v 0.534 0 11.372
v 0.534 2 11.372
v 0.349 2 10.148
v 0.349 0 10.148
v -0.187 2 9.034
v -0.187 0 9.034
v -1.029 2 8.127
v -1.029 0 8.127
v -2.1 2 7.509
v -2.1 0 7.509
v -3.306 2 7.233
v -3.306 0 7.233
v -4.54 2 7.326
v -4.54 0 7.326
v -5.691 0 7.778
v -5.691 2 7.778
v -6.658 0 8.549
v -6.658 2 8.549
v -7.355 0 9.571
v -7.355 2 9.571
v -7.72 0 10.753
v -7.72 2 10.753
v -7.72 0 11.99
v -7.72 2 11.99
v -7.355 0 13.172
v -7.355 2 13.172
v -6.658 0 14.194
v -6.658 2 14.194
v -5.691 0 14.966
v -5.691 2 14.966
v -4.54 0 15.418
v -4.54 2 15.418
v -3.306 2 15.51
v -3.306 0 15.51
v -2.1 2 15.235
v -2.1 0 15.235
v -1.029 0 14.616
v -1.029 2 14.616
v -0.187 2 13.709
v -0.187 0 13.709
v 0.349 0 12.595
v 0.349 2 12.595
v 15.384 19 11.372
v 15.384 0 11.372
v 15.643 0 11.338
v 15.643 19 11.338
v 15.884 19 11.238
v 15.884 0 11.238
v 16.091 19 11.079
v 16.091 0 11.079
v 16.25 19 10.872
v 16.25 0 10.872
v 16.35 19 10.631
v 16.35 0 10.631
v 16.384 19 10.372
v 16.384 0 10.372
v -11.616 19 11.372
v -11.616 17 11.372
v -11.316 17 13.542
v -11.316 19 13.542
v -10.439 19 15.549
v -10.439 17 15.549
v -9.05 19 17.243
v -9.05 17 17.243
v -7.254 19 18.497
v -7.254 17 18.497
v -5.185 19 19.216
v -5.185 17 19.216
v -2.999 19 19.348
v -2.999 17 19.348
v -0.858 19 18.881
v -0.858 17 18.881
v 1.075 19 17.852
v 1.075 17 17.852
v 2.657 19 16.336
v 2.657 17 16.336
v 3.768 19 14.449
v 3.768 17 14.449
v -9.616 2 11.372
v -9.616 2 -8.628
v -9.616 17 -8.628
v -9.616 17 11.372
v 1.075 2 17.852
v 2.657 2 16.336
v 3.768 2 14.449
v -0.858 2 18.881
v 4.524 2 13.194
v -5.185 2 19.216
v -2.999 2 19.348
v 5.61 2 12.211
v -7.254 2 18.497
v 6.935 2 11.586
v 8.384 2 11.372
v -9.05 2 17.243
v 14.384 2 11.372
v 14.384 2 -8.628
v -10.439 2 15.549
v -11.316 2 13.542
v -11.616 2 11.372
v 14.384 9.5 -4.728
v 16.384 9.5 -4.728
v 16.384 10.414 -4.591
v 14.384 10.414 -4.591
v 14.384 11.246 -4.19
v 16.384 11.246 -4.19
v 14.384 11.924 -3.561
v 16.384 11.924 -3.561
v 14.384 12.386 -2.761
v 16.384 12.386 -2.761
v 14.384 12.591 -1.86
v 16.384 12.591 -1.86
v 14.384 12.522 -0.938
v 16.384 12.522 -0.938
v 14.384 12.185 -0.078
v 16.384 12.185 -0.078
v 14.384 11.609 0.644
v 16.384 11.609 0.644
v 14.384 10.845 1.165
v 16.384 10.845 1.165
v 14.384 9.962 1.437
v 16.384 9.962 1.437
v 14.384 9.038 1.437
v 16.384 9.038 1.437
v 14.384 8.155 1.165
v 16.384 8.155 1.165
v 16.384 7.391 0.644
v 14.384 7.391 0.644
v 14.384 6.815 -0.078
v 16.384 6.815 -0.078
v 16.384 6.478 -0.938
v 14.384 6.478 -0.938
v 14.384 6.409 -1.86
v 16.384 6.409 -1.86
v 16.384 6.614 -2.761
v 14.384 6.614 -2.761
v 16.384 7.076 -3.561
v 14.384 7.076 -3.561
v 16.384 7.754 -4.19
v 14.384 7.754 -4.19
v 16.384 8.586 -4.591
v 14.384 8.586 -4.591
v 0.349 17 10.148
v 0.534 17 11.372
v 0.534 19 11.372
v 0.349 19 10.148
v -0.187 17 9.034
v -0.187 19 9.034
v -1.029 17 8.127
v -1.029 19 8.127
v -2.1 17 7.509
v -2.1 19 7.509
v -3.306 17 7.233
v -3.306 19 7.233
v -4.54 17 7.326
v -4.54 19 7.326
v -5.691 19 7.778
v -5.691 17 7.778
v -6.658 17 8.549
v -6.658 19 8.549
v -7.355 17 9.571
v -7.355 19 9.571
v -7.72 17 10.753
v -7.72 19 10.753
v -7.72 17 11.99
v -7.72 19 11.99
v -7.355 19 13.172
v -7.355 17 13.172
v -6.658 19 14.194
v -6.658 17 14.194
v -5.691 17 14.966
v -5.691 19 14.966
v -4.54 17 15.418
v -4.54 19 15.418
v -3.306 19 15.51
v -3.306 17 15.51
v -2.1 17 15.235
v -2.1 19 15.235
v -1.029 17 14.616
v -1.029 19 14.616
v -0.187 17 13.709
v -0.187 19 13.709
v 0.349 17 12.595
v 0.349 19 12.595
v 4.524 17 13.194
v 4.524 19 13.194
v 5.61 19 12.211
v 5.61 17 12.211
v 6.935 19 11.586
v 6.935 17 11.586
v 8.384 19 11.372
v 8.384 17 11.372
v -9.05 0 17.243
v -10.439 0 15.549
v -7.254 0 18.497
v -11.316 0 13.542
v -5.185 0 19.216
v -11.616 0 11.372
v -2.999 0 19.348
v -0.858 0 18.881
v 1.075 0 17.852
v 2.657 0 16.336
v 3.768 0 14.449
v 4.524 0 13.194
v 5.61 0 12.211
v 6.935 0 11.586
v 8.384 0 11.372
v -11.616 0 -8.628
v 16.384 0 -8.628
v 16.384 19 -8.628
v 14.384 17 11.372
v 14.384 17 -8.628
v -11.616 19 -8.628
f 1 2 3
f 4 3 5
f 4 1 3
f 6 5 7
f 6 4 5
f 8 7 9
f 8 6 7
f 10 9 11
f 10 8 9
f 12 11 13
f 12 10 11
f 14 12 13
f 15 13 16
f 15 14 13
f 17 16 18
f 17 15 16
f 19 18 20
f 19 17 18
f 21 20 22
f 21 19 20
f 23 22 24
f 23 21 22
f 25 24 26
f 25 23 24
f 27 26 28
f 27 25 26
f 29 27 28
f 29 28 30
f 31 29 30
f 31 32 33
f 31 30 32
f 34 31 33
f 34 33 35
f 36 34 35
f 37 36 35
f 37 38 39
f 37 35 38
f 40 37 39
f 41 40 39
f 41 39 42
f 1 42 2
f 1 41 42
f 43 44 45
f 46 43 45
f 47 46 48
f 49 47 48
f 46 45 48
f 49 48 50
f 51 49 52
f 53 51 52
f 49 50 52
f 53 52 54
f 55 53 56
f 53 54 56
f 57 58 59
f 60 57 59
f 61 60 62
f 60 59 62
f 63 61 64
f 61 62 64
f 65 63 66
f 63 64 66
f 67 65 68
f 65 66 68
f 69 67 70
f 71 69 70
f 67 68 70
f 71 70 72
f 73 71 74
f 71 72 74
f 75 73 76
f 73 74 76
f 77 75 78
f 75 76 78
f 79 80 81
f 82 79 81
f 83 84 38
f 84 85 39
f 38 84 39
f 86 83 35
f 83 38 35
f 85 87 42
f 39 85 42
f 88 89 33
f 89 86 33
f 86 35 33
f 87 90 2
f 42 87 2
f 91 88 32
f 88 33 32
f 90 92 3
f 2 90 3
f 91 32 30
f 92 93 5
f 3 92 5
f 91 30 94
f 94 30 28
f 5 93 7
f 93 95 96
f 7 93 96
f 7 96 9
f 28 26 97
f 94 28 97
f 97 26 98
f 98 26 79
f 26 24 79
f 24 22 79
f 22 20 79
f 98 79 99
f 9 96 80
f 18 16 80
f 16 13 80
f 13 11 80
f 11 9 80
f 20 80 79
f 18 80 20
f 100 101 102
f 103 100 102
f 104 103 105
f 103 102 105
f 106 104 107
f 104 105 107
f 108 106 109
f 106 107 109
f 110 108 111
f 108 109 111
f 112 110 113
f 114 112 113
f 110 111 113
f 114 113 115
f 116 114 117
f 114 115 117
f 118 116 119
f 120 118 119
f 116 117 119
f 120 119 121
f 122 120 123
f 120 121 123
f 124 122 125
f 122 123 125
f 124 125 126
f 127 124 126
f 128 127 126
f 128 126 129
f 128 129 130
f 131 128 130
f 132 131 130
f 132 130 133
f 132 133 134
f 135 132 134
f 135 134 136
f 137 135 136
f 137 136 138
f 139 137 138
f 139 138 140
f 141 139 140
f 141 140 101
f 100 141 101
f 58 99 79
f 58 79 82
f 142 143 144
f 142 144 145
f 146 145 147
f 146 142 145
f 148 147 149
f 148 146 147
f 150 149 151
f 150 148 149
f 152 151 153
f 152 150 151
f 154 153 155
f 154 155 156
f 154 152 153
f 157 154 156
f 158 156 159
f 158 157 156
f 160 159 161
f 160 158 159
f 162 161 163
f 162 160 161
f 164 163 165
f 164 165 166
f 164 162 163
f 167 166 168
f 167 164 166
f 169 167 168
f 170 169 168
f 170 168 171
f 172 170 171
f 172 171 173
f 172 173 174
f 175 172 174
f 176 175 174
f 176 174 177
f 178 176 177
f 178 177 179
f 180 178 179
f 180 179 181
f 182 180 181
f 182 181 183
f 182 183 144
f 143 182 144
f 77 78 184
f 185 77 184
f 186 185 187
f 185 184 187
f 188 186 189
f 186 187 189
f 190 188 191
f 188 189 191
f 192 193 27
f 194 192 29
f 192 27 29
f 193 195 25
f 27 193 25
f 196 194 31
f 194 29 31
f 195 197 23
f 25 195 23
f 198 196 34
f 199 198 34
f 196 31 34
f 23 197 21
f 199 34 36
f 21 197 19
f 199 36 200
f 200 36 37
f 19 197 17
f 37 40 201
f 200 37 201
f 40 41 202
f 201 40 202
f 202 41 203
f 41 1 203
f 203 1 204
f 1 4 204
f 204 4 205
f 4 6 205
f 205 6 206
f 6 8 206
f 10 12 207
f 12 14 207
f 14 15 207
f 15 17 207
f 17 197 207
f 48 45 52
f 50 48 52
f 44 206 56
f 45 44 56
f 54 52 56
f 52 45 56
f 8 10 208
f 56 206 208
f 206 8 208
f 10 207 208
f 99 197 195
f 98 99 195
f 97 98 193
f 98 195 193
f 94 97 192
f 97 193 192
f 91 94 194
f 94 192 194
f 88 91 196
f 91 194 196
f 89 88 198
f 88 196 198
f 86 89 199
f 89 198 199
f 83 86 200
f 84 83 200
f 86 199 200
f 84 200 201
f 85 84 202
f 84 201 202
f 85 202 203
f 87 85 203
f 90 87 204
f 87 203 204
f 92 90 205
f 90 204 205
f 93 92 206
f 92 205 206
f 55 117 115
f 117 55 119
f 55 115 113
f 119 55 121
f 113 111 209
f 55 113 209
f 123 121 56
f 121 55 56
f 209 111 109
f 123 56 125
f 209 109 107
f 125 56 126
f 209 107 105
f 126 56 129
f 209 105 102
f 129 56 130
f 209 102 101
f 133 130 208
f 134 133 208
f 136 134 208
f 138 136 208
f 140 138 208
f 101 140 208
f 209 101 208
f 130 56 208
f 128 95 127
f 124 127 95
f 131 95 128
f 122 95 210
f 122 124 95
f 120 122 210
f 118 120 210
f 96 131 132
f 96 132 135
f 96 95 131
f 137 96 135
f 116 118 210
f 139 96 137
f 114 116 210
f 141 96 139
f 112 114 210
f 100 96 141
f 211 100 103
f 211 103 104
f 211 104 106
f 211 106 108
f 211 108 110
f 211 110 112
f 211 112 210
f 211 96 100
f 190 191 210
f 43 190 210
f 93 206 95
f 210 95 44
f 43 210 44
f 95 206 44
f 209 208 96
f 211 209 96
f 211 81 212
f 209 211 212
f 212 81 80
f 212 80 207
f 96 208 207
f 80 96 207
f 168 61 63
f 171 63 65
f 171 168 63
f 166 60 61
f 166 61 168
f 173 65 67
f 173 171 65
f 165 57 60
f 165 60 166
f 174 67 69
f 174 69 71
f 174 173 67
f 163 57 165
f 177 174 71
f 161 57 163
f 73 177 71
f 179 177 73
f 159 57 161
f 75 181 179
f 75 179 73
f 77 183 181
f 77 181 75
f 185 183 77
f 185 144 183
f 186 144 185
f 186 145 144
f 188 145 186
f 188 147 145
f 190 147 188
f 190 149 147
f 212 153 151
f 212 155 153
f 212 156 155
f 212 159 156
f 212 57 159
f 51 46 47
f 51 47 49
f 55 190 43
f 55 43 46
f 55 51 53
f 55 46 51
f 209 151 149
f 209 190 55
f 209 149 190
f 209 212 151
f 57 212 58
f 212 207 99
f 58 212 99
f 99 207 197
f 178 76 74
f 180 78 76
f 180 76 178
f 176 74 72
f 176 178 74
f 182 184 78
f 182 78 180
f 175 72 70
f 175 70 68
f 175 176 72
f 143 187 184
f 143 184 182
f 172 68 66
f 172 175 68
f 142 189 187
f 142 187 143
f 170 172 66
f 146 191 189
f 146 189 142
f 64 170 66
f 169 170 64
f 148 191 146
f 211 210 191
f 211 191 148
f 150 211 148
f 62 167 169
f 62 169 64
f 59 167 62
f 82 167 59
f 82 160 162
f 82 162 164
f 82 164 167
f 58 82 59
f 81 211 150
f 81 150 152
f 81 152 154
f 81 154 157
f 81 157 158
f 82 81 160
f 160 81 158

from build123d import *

# Parameters (mm, degrees)
BOSS_EXTRUDE1_DEPTH = 19
SKETCH2_W           = 24
SKETCH2_H           = 15
CUT_EXTRUDE1_DEPTH  = 38.59555024
SKETCH3_W           = 5.291502622
SKETCH3_H           = 15
CUT_EXTRUDE2_DEPTH  = 39.990548382
SKETCH4_R           = 3.1
CUT_EXTRUDE4_DEPTH  = 9


with BuildPart() as part:
    # Sketch1 → Boss-Extrude1 (new body)
    with BuildSketch(Plane(origin=(0, 0, 0), x_dir=(1, 0, 0), z_dir=(0, 1, 0))):
        with BuildLine():
            Line((16.383693046, 8.628297362), (-11.616306954, 8.628297362))
            Line((-11.616306954, 8.628297362), (-11.616306954, -11.371702638))
            ThreePointArc((-11.616306954, -11.371702638), (-5.185236036, -19.216348043), (3.76830843, -14.448625715))
            ThreePointArc((3.76830843, -14.448625715), (5.610192064, -12.211451166), (8.383693046, -11.371702638))
            Line((8.383693046, -11.371702638), (15.383693046, -11.371702638))
            ThreePointArc((15.383693046, -11.371702638), (16.090799827, -11.078809419), (16.383693046, -10.371702638))
            Line((16.383693046, -10.371702638), (16.383693046, 8.628297362))
        make_face()
        with BuildLine():
            ThreePointArc((-7.766306954, -11.371702638), (-3.616306954, -15.521702638), (0.533693046, -11.371702638))
            ThreePointArc((0.533693046, -11.371702638), (-3.616306954, -7.221702638), (-7.766306954, -11.371702638))
        make_face(mode=Mode.SUBTRACT)
    extrude(amount=BOSS_EXTRUDE1_DEPTH)

    # Sketch2 → Cut-Extrude1 (cut, through all)
    with BuildSketch(Plane(origin=(0, 0, -8.628297362), x_dir=(-1, 0, 0), z_dir=(0, 0, -1))):
        with Locations((-2.383693046, 9.5)):
            Rectangle(SKETCH2_W, SKETCH2_H)
    extrude(amount=-CUT_EXTRUDE1_DEPTH, mode=Mode.SUBTRACT)

    # Sketch3 → Cut-Extrude2 (cut, through all)
    with BuildSketch(Plane.ZY.offset(11.616306954)):
        with Locations((14.017453949, 9.5)):
            Rectangle(SKETCH3_W, SKETCH3_H)
    extrude(amount=-CUT_EXTRUDE2_DEPTH, mode=Mode.SUBTRACT)

    # Sketch4 → Cut-Extrude4 (cut)
    with BuildSketch(Plane(origin=(16.383693046, 0, 0), x_dir=(0, 0, -1), z_dir=(1, 0, 0))):
        with Locations((1.628297362, 9.5)):
            Circle(SKETCH4_R)
    extrude(amount=-CUT_EXTRUDE4_DEPTH, mode=Mode.SUBTRACT)


solid = part.part
